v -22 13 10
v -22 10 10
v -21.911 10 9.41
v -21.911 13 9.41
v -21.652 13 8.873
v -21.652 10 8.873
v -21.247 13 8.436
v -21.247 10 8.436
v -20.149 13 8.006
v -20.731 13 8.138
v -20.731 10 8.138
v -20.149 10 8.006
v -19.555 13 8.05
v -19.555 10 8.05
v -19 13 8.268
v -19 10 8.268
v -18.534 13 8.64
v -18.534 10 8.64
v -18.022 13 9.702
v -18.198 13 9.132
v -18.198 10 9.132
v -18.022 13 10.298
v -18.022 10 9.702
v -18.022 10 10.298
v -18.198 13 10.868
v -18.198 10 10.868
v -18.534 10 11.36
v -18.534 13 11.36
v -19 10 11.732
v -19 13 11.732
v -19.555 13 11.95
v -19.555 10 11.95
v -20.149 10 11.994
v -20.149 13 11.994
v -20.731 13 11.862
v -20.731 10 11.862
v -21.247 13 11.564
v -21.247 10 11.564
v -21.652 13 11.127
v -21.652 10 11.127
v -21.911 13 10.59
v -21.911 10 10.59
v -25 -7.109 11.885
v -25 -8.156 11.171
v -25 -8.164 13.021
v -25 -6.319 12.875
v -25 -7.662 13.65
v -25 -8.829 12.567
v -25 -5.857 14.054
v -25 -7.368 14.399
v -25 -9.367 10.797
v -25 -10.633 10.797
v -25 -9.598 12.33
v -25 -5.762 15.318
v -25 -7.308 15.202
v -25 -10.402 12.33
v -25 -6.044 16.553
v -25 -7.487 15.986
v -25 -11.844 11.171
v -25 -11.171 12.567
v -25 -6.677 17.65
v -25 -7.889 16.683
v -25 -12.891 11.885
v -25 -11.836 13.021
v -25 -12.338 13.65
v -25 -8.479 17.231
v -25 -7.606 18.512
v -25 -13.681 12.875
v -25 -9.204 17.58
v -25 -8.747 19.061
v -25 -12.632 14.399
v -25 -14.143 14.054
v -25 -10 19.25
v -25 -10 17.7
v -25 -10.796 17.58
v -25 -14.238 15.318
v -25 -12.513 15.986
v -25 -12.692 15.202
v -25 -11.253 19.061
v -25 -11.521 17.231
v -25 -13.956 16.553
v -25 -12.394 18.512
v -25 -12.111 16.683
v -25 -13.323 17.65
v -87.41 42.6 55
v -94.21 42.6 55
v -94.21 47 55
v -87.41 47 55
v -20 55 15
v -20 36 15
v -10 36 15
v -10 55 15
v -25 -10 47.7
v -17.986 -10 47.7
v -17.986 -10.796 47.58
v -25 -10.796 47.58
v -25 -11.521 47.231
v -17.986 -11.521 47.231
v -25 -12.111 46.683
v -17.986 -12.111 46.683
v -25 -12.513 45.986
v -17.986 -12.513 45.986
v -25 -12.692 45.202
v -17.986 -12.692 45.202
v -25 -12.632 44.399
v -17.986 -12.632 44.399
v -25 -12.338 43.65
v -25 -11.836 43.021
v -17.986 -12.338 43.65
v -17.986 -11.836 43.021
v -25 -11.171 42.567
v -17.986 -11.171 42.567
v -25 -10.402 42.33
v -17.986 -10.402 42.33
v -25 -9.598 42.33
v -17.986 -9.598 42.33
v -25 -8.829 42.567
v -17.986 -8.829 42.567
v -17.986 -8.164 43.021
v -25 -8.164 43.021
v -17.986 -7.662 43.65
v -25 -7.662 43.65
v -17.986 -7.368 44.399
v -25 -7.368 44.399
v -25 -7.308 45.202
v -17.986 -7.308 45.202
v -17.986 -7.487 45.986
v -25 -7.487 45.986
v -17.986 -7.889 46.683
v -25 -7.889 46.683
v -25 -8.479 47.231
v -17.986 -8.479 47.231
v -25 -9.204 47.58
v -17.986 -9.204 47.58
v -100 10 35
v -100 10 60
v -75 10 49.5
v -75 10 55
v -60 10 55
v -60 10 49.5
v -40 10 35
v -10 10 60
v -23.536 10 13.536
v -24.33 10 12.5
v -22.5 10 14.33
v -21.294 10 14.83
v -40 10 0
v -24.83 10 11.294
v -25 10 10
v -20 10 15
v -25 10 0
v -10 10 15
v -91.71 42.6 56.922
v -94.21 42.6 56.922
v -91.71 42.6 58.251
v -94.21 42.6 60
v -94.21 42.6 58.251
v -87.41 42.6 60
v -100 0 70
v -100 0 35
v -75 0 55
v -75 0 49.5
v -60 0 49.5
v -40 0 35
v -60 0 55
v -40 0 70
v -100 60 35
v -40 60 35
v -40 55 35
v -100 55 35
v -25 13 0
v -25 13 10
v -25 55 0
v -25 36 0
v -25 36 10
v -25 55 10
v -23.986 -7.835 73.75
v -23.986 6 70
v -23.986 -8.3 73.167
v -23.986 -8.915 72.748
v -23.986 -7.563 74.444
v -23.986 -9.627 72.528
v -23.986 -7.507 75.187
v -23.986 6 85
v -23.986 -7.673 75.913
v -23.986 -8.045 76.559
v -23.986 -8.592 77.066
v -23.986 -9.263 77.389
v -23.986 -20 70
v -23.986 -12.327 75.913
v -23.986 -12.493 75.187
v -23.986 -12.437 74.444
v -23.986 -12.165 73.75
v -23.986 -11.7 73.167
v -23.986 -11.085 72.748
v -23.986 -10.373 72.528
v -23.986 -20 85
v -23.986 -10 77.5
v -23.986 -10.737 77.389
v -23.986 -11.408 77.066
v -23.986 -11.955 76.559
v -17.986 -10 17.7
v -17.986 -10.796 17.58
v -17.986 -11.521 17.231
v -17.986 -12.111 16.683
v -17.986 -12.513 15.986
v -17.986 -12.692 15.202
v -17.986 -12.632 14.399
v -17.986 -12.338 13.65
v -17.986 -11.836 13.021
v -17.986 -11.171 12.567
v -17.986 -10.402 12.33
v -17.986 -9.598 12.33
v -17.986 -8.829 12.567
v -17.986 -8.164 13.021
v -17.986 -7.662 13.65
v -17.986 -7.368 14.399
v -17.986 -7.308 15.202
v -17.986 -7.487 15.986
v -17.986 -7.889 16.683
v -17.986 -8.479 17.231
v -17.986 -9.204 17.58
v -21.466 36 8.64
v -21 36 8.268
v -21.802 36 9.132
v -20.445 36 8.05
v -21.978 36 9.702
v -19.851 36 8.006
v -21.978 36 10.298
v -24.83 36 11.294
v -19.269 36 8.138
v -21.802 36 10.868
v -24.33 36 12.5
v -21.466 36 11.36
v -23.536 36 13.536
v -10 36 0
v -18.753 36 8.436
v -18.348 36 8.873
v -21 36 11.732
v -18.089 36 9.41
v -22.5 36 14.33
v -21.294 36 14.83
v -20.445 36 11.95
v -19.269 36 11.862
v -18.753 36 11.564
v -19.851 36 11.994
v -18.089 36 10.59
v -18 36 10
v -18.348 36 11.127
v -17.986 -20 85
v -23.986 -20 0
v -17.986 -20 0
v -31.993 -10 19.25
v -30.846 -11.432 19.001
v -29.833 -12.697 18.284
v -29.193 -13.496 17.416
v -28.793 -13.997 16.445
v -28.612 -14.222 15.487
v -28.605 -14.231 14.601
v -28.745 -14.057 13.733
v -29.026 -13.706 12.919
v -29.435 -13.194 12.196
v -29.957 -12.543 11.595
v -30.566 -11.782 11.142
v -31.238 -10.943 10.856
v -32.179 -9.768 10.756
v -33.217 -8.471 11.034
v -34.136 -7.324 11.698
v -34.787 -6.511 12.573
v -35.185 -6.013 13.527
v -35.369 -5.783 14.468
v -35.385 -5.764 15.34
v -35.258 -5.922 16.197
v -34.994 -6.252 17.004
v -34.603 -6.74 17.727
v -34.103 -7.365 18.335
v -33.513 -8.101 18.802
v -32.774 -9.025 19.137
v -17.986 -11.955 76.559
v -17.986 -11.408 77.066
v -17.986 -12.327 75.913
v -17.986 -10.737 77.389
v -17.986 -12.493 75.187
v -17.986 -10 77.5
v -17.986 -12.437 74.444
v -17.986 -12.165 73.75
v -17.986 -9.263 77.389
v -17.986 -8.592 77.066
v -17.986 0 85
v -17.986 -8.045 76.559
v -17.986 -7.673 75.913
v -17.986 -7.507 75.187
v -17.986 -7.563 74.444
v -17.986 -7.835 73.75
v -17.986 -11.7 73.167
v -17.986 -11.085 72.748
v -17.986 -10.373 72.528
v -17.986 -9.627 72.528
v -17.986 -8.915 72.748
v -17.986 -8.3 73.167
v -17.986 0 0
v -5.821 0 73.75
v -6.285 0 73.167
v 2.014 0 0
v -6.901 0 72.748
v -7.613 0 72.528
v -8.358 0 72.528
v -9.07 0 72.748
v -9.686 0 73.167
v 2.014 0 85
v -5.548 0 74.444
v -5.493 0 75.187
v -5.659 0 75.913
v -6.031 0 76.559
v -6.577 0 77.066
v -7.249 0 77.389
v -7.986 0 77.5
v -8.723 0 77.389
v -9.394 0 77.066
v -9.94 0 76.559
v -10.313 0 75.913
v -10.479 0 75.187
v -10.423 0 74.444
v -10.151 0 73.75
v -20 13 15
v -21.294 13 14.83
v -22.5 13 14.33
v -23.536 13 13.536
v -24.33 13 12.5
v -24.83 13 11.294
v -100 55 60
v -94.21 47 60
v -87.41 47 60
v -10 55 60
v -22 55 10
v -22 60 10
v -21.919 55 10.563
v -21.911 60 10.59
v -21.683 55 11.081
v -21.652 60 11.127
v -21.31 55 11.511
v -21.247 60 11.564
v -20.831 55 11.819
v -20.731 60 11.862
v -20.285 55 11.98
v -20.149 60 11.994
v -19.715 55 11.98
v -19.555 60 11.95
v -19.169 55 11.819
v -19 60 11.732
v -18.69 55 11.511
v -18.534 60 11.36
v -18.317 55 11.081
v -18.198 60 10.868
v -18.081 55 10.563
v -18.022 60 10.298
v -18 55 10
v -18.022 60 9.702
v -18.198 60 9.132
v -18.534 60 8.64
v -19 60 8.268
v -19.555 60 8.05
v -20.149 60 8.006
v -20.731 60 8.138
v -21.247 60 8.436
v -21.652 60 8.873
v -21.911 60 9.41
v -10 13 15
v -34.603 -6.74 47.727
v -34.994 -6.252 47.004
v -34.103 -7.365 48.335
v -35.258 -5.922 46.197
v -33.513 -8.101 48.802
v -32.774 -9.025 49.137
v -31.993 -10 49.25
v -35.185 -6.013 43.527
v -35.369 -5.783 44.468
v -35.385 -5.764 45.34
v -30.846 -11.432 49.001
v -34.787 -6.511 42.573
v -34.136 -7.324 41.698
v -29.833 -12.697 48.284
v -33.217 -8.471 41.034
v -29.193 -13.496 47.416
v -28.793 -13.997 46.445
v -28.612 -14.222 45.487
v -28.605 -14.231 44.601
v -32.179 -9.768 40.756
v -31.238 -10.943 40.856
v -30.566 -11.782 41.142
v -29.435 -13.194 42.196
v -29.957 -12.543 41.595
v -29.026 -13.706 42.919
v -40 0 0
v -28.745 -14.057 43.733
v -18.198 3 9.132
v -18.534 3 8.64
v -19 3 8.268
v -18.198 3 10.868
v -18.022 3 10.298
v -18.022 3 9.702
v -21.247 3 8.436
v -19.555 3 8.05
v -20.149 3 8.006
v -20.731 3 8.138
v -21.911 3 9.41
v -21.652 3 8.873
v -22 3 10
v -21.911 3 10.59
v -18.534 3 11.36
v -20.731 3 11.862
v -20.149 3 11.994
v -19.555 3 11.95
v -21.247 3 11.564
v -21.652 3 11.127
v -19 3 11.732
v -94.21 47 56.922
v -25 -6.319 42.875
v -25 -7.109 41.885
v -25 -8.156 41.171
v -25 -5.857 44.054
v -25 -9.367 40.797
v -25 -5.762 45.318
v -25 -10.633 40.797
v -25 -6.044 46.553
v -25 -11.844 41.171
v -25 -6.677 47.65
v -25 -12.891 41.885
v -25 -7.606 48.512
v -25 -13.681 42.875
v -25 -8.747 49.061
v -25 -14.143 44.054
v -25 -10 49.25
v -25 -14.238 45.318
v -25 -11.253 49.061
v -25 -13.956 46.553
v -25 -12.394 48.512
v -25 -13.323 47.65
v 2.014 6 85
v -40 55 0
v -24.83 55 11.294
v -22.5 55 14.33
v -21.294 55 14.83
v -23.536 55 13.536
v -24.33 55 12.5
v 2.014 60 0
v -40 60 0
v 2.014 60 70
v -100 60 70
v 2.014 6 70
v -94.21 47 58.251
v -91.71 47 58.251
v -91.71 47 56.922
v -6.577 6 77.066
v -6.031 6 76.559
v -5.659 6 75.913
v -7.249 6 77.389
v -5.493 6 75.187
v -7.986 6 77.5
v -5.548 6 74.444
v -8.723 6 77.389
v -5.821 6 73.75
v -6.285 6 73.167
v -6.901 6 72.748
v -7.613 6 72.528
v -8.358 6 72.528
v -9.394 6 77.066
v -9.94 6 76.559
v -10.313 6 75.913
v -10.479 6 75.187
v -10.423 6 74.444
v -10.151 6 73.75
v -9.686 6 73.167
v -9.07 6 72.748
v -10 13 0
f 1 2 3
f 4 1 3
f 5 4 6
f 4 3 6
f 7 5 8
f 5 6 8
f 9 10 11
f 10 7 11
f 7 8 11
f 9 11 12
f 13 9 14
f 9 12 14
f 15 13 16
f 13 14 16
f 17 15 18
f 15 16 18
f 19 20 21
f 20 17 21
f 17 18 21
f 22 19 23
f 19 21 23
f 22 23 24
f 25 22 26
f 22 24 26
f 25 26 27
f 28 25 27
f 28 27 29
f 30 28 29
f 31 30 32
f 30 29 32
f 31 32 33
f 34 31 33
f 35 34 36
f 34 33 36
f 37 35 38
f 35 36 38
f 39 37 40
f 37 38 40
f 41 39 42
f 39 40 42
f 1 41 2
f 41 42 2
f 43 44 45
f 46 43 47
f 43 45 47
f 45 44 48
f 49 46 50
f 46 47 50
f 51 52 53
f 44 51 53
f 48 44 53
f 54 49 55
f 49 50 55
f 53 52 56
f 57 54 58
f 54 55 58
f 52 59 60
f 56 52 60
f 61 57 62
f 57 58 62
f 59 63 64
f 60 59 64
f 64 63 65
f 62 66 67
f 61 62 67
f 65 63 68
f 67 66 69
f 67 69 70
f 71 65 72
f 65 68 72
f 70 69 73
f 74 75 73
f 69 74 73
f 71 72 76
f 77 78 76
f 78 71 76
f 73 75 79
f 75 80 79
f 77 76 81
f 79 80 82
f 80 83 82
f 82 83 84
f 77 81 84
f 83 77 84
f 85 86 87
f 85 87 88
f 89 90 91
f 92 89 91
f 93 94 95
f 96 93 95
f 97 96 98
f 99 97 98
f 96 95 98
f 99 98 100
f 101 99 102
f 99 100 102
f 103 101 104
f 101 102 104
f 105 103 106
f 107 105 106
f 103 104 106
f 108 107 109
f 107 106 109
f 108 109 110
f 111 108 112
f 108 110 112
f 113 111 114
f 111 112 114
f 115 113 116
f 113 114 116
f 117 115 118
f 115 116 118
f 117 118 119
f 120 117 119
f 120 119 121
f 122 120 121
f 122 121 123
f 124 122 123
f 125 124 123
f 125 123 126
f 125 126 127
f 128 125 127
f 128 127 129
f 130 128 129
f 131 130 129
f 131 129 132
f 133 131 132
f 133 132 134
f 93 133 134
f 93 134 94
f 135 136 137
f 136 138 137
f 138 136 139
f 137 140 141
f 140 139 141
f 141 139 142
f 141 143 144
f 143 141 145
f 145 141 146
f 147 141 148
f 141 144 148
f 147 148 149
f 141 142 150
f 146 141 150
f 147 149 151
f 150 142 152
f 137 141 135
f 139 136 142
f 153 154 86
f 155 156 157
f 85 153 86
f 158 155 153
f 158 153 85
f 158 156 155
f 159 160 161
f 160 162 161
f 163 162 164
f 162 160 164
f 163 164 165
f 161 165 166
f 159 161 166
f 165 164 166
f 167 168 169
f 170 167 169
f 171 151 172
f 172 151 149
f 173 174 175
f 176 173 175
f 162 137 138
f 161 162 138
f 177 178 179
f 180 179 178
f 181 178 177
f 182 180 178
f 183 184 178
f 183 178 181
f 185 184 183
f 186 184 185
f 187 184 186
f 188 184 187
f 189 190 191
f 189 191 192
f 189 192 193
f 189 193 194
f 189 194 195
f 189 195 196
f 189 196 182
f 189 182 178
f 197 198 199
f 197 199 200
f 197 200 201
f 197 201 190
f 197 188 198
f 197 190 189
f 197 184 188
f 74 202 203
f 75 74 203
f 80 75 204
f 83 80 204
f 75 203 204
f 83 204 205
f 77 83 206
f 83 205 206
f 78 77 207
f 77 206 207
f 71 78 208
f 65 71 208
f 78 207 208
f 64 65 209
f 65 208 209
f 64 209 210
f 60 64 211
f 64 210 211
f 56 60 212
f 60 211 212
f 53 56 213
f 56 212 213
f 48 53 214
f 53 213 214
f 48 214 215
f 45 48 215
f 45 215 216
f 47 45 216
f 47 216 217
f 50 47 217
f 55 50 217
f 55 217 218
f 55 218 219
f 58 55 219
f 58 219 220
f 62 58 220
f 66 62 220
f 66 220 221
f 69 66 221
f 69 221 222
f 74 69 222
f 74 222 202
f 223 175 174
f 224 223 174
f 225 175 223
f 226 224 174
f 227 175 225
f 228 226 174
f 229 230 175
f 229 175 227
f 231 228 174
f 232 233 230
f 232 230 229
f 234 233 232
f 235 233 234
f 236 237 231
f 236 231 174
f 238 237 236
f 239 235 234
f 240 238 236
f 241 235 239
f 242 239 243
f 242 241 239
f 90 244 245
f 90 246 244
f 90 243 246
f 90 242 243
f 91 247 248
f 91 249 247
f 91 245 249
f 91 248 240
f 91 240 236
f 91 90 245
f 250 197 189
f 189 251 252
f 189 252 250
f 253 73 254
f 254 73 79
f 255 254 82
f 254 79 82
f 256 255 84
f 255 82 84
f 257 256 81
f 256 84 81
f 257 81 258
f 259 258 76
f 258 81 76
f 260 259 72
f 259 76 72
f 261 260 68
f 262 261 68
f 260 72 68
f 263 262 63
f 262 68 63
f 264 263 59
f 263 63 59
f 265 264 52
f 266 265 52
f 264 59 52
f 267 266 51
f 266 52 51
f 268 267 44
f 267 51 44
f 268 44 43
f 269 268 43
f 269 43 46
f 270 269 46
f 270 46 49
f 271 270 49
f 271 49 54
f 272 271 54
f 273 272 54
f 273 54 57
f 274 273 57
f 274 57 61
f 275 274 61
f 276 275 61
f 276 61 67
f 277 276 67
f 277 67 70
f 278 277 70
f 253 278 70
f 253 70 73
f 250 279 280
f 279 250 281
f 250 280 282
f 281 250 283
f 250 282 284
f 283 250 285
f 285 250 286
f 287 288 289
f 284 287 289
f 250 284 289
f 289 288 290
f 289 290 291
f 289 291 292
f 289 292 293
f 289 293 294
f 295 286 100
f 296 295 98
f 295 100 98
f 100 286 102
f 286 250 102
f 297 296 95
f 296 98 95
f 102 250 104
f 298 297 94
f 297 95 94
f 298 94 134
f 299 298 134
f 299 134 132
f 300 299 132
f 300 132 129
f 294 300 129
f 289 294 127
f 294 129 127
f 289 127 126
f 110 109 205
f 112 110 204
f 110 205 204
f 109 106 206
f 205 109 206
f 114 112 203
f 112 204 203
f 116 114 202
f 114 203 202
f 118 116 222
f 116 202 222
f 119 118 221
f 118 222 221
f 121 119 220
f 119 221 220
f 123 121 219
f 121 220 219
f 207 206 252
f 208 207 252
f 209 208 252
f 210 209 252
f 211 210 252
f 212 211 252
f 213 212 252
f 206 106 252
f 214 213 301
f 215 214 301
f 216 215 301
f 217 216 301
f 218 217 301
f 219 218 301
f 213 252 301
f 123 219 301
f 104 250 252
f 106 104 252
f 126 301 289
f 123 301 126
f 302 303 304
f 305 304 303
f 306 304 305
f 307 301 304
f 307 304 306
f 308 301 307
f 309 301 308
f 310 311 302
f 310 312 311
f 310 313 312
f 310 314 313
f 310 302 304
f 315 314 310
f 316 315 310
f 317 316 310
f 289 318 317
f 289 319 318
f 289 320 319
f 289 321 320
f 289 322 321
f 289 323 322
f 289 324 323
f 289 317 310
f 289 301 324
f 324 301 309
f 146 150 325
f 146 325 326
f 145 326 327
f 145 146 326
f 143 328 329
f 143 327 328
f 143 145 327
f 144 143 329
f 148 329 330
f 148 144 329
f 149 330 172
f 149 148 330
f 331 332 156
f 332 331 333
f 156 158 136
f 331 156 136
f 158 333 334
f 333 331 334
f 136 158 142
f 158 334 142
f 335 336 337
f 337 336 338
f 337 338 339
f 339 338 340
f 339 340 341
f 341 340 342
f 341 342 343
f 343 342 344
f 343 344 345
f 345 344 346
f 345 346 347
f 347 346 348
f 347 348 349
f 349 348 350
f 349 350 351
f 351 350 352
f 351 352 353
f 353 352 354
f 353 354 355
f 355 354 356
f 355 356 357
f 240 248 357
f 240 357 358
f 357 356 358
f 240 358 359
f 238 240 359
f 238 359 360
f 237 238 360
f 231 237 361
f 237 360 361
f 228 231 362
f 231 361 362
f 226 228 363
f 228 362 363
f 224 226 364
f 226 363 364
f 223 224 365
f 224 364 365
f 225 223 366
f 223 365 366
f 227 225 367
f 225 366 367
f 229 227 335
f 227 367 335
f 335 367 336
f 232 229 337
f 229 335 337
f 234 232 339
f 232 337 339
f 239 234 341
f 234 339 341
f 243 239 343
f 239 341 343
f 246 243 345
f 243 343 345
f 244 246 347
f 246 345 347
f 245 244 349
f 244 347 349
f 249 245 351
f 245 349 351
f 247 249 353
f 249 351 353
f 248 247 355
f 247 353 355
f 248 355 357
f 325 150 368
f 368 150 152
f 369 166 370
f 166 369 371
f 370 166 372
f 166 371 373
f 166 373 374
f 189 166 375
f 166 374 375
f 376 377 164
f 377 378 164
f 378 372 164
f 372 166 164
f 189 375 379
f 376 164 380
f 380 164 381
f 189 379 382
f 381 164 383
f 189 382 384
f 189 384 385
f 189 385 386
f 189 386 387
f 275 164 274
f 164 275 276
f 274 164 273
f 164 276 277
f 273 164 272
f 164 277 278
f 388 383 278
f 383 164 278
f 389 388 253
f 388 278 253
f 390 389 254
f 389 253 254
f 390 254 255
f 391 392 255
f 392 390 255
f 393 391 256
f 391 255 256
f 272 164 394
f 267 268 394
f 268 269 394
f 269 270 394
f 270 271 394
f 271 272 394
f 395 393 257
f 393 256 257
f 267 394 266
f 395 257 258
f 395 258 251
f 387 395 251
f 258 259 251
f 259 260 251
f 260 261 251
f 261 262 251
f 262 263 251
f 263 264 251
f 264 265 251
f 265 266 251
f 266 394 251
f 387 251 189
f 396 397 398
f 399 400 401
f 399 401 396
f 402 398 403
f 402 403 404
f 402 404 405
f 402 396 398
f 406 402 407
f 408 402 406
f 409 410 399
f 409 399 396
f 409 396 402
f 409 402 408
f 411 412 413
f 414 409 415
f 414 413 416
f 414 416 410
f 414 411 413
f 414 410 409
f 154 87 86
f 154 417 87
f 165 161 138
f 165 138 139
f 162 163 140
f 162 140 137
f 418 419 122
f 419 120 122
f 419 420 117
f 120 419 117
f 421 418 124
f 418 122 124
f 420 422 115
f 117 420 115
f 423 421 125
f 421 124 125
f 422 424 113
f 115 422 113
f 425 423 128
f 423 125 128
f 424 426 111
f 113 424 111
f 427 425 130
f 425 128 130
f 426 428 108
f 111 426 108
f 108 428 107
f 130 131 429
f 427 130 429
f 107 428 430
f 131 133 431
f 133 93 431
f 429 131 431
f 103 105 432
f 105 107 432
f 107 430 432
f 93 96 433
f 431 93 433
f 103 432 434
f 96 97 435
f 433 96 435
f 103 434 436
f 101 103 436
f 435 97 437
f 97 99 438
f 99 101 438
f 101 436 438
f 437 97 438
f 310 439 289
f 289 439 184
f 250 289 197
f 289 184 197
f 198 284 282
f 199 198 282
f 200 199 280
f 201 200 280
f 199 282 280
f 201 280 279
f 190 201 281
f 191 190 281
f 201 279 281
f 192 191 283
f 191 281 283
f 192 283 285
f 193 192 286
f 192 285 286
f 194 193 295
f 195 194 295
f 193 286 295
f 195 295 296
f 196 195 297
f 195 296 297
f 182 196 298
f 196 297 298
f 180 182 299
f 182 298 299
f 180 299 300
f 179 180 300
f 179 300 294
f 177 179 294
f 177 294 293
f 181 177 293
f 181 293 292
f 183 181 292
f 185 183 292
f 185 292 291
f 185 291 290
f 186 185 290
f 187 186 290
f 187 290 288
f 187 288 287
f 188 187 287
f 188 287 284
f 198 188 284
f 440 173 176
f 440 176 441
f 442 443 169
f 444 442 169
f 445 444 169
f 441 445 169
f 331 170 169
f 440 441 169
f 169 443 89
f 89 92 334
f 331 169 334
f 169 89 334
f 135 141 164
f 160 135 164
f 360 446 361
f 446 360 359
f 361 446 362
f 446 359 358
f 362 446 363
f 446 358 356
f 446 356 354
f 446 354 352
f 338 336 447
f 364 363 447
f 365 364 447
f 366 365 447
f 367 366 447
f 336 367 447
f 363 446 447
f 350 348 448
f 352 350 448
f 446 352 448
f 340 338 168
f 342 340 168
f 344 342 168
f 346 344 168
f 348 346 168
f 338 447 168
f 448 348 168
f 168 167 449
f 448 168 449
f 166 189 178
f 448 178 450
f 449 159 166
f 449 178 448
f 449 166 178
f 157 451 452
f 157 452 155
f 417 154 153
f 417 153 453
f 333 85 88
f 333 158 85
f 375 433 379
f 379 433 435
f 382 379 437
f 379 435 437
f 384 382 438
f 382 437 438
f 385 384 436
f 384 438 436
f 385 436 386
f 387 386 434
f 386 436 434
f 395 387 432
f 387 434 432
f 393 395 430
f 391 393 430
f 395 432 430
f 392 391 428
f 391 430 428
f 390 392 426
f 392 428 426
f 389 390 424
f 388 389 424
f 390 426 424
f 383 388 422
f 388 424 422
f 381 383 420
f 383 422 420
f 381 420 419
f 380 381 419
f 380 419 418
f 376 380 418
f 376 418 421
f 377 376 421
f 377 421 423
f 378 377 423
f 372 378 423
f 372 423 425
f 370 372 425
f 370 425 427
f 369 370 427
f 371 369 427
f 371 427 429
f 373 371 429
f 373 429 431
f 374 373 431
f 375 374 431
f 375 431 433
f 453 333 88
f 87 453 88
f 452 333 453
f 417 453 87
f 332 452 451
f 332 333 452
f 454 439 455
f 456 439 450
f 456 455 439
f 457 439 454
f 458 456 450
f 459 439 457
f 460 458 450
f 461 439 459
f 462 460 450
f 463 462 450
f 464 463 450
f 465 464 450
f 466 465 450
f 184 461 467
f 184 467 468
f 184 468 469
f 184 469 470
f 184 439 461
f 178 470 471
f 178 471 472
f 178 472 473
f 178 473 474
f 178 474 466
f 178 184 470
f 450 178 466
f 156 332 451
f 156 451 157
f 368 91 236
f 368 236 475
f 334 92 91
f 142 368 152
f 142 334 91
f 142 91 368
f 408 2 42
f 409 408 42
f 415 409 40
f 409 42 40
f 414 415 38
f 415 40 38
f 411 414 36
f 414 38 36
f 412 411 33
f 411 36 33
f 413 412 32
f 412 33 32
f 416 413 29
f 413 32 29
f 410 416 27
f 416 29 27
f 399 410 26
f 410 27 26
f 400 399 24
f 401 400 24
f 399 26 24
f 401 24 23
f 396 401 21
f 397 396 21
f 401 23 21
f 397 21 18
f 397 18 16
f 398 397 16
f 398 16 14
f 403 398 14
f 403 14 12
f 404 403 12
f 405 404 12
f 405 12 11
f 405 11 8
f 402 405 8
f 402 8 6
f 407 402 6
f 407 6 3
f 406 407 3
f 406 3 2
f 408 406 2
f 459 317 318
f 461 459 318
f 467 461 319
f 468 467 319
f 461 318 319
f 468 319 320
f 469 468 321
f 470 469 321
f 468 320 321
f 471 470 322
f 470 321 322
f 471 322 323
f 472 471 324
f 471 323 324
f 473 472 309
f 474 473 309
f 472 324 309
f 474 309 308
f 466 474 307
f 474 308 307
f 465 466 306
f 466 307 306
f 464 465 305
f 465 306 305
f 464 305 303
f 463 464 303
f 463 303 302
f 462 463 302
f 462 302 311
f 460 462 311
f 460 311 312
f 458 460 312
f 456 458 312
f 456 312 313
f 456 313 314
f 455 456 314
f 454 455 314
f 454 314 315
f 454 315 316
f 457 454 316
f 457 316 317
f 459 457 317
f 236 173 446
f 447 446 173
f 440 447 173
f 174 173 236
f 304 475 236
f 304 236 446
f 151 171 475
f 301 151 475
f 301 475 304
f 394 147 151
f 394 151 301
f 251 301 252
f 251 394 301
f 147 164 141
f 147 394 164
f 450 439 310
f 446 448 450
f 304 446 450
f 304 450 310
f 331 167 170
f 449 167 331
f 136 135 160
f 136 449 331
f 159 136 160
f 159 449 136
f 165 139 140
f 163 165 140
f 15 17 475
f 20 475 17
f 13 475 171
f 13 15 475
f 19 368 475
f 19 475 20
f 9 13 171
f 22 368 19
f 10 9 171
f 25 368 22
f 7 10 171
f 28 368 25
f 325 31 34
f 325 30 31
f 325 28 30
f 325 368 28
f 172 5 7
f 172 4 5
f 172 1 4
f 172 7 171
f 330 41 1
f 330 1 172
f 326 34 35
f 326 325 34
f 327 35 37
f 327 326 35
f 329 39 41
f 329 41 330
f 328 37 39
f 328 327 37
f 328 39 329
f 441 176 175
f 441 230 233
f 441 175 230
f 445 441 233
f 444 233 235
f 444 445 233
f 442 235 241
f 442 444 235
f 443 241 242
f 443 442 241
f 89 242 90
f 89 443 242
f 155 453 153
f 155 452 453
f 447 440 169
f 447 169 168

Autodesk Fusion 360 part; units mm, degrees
sketch "Sketch3" plane through (0, 0, 0) normal (0, 0, 1) x (1, 0, 0)
  line L0 (0, 0) -> (-40, 0)
  line L1 (-40, 0) -> (-40, 60)
  line L2 (-40, 60) -> (0, 60)
  line L3 (0, 60) -> (0, 0)
  line L4 (-17.9857, 0) -> (-23.9857, 0)
  line L5 (-23.9857, 0) -> (-23.9857, -20)
  line L6 (-23.9857, -20) -> (-17.9857, -20)
  line L7 (-17.9857, -20) -> (-17.9857, 0)
  line L8 (-40, 0) -> (-23.9857, -20)
  line L9 (-17.9857, 0) -> (2.0143, 0)
  line L10 (2.0143, 0) -> (2.0143, 1.9843)
  line L11 (2.0143, 1.9843) -> (2.0143, 60)
  line L12 (2.0143, 60) -> (0, 60)
  dimension "d16" = 60
  dimension "d17" = 40
  dimension "d18" = 20
  dimension "d19" = 6
  dimension "d63" = 20
extrude "Extrude1" add sketch "Sketch3" along normal blind 85 contours L0 L1 L2 L3 L4 L9 | L0 L4 L5 L6 L7 | L0 L5 L8
sketch "Sketch5" plane through (0, 0, 85) normal (0, 0, 1) x (-1, 0, 0)
  line L0 (23.9857, 20) -> (17.9857, 20)
  line L1 (17.9857, 20) -> (17.9857, 0)
  line L2 (17.9857, 0) -> (0, 0)
  line L3 (0, 0) -> (0, -60)
  line L4 (0, -60) -> (40, -60)
  line L5 (40, -60) -> (40, 0)
  line L6 (40, -60) -> (0, -60)
  line L7 (0, -6) -> (23.9857, -6)
  line L8 (23.9857, -6) -> (23.9857, 0)
  line L9 (40, 0) -> (23.9857, 20)
  line L10 (23.9857, 0) -> (23.9857, 20)
  dimension "d20" = 6
extrude "Extrude2" cut sketch "Sketch5" against normal blind 15 contours L3 L4 L5 L6 L7 L8 L9 L10
sketch "Sketch6" plane through (-40, 0, 0) normal (-1, 0, 0) x (0, -1, 0)
  line L0 (0, 70) -> (-60, 70)
  line L1 (-60, 70) -> (-60, 0)
  line L2 (-60, 0) -> (0, 0)
  line L3 (-55, 0) -> (-10, 0)
  line L4 (-10, 0) -> (-10, 60)
  line L5 (-10, 60) -> (-55, 60)
  line L6 (-55, 60) -> (-55, 0)
  line L7 (0, 0) -> (0, 70)
  dimension "d23" = 45
  dimension "d27" = 10
  dimension "d28" = 60
extrude "Extrude3" cut sketch "Sketch6" against normal blind 30 contours L2 L3 L4 L5 L6
sketch "Sketch7" plane through (0, 60, 0) normal (0, 1, 0) x (-1, 0, 0)
  line L0 (40, 70) -> (0, 70)
  line L1 (0, 70) -> (0, 0)
  line L2 (0, 0) -> (40, 0)
  line L3 (40, 0) -> (40, 70)
  line L4 (20, 70) -> (20, 10) construction
  circle A0 centre (20, 10) radius 2
  point P0 (20, 10)
  dimension "d29" = 60
  dimension "d30" = 20
  dimension "d31" = 4
extrude "Extrude4" cut sketch "Sketch7" against normal blind 57 contours A0
sketch "Sketch8" plane through (0, 55, 0) normal (0, -1, 0) x (1, 0, 0)
  circle A0 centre (-20, 10) radius 2
  line L0 (-40, 60) -> (-40, 0)
  line L1 (-40, 0) -> (-10, 0)
  line L2 (-10, 0) -> (-10, 60)
  line L3 (-10, 60) -> (-40, 60)
  line L4 (-10, 0) -> (-25, 0)
  line L5 (-25, 0) -> (-25, 10)
  line L6 (-20, 15) -> (-10, 15)
  line L7 (-10, 15) -> (-10, 0)
  arc A1 (-20, 15) -> (-25, 10) centre (-20, 10) ccw
  dimension "d34" = 5
extrude "Extrude5" add sketch "Sketch8" along normal blind 19 contours L1 L2 L4 L5 L6 L7 A1
sketch "Sketch10" plane through (0, 36, 0) normal (0, -1, 0) x (1, 0, 0)
  circle A0 centre (-20, 10) radius 2
  line L0 (-10, 15) -> (-20, 15)
  arc A1 (-20, 15) -> (-25, 10) centre (-20, 10) ccw
  line L1 (-25, 10) -> (-25, 0)
  line L2 (-25, 0) -> (-10, 0)
  line L3 (-10, 0) -> (-10, 15)
  line L4 (-20, 10) -> (-90.5618, 57.3923)
  dimension "d39" = 85
sketch "Sketch11" plane through (-40, 0, 0) normal (-1, 0, 0) x (0, -1, 0)
  line L0 (-55, 0) -> (-55, 60)
  line L1 (-55, 60) -> (-10, 60)
  line L2 (-10, 60) -> (-10, 0)
  line L3 (-10, 0) -> (0, 0)
  line L4 (0, 0) -> (0, 70)
  line L5 (0, 70) -> (-60, 70)
  line L6 (-60, 70) -> (-60, 0)
  line L7 (-60, 0) -> (-55, 0)
  line L8 (0, 70) -> (-60, 70)
  line L9 (-60, 35) -> (-55, 35)
  line L10 (-55, 60) -> (-10, 60)
  line L11 (-10, 35) -> (0, 35)
extrude "Extrude6" add sketch "Sketch11" along normal blind 60 contours L0 L1 L2 L4 L5 L6 L8 L9 L10 L11
sketch "Sketch12" plane through (0, 0, 60) normal (0, 0, -1) x (1, 0, 0)
  line L0 (-100, -55) -> (-10, -55)
  line L1 (-10, -55) -> (-10, -10)
  line L2 (-10, -10) -> (-100, -10)
  line L3 (-100, -10) -> (-100, -55)
  line L4 (-94.2104, -42.6) -> (-87.4104, -42.6)
  line L5 (-87.4104, -42.6) -> (-87.4104, -47)
  line L6 (-87.4104, -47) -> (-94.2104, -47)
  line L7 (-94.2104, -47) -> (-94.2104, -42.6)
  dimension "d71" = 6.8
  dimension "d72" = 4.4
  dimension "d73" = 8
extrude "Extrude7" add sketch "Sketch12" along normal blind 5 contours L4 L5 L6 L7
sketch "Sketch13" plane through (-94.2104, 0, 0) normal (-1, 0, 0) x (0, -1, 0)
  line L0 (-42.6, 60) -> (-47, 60)
  line L1 (-47, 60) -> (-47, 55)
  line L2 (-47, 55) -> (-42.6, 55)
  line L3 (-42.6, 55) -> (-42.6, 60)
  line L4 (-47, 58.2513) -> (-42.6, 58.2513)
  line L5 (-42.6, 58.2513) -> (-42.6, 56.9215)
  line L6 (-42.6, 56.9215) -> (-47, 56.9215)
  line L7 (-47, 56.9215) -> (-47, 58.2513)
extrude "Extrude8" cut sketch "Sketch13" against normal blind 2.5 contours L1 L3 L4 L5 L6 L7
sketch "Sketch14" plane through (0, 6, 0) normal (0, 1, 0) x (-1, 0, 0)
  line L0 (23.9857, 85) -> (0, 85)
  line L1 (0, 85) -> (0, 70) construction
  line L2 (0, 70) -> (23.9857, 70)
  line L3 (23.9857, 70) -> (23.9857, 85)
  line L4 (-2.0143, 85) -> (17.9857, 85) construction
  line L5 (17.9857, 85) -> (17.9857, 65) construction
  line L6 (17.9857, 65) -> (-2.0143, 65) construction
  line L7 (-2.0143, 65) -> (-2.0143, 85) construction
  line L8 (17.9857, 85) -> (-2.0143, 65) construction
  line L9 (-2.0143, 85) -> (17.9857, 65) construction
  point P0 (7.9857, 75)
  dimension "d68" = 6
  dimension "d69" = 20
  dimension "d70" = 20
hole "Hole3" at (-7.9857, 6, 75) direction (0, -1, 0) diameter 5 depth 10 tip angle 118
sketch "Sketch15" plane through (-23.9857, 0, 0) normal (-1, 0, 0) x (0, -1, 0)
  line L0 (20, 85) -> (-6, 85) construction
  line L1 (-6, 85) -> (-6, 70)
  line L2 (-6, 70) -> (20, 70) construction
  line L3 (20, 70) -> (20, 85) construction
  line L4 (20, 85) -> (0, 85) construction
  line L5 (0, 85) -> (0, 65) construction
  line L6 (0, 65) -> (20, 65) construction
  line L7 (20, 65) -> (20, 85) construction
  line L8 (20, 85) -> (0, 65) construction
  line L9 (0, 85) -> (20, 65) construction
  point P0 (10, 75)
  dimension "d51" = 20
  dimension "d52" = 20
hole "Hole4" at (-23.9857, -10, 75) direction (1, 0, 0) diameter 5 depth 6 tip angle 118
sketch "Sketch16" plane through (-40, 0, 0) normal (-1, 0, 0) x (0, -1, 0)
  line L0 (0, 35) -> (-10, 35)
  line L1 (-10, 35) -> (-10, 0)
  line L2 (-10, 0) -> (0, 0)
  line L3 (0, 0) -> (0, 35)
  line L4 (10, 75) -> (10, 0) construction
  point P0 (10, 15)
  point P1 (10, 45)
hole "Hole5" at (-40, -10, 15) at (-40, -10, 45) direction (1, 0, 0) diameter 5.4 depth 25 tip angle 180 counterbore diameter 8.5 counterbore depth 15
extrude "Extrude9" add 1 faces at (0, 22, 23.3333) along direction (1, 0, 0) blind 2.014
sketch "Sketch18" plane through (0, 10, 0) normal (0, 1, 0) x (-1, 0, 0)
  circle A0 centre (20, 10) radius 2
  line L0 (100, 60) -> (10, 60)
  line L1 (10, 60) -> (10, 0)
  line L2 (10, 0) -> (40, 0)
  line L3 (40, 0) -> (40, 35)
  line L4 (40, 35) -> (100, 35)
  line L5 (100, 35) -> (100, 60)
  line L6 (10, 0) -> (25, 0)
  line L7 (25, 0) -> (25, 10)
  line L8 (20, 15) -> (10, 15)
  line L9 (10, 15) -> (10, 0)
  arc A1 (25, 10) -> (20, 15) centre (20, 10) ccw
  dimension "d74" = 5
extrude "Extrude10" add sketch "Sketch18" along normal blind 3 contours L1 L2 L6 L7 L8 L9 A1
sketch "Sketch19" plane through (0, 0, 0) normal (0, -1, 0) x (1, 0, 0)
  line L0 (-40, 35) -> (-40, 70)
  line L1 (-40, 70) -> (-100, 70)
  line L2 (-100, 70) -> (-100, 35)
  line L3 (-100, 35) -> (-40, 35)
  line L4 (-75, 55) -> (-60, 55)
  line L5 (-60, 55) -> (-60, 49.5)
  line L6 (-60, 49.5) -> (-75, 49.5)
  line L7 (-75, 49.5) -> (-75, 55)
  dimension "d77" = 15
  dimension "d78" = 5.5
extrude "Extrude11" cut sketch "Sketch19" against normal blind 10 contours L4 L5 L6 L7
equation "d65 = 20 mm - 17.986 mm"
